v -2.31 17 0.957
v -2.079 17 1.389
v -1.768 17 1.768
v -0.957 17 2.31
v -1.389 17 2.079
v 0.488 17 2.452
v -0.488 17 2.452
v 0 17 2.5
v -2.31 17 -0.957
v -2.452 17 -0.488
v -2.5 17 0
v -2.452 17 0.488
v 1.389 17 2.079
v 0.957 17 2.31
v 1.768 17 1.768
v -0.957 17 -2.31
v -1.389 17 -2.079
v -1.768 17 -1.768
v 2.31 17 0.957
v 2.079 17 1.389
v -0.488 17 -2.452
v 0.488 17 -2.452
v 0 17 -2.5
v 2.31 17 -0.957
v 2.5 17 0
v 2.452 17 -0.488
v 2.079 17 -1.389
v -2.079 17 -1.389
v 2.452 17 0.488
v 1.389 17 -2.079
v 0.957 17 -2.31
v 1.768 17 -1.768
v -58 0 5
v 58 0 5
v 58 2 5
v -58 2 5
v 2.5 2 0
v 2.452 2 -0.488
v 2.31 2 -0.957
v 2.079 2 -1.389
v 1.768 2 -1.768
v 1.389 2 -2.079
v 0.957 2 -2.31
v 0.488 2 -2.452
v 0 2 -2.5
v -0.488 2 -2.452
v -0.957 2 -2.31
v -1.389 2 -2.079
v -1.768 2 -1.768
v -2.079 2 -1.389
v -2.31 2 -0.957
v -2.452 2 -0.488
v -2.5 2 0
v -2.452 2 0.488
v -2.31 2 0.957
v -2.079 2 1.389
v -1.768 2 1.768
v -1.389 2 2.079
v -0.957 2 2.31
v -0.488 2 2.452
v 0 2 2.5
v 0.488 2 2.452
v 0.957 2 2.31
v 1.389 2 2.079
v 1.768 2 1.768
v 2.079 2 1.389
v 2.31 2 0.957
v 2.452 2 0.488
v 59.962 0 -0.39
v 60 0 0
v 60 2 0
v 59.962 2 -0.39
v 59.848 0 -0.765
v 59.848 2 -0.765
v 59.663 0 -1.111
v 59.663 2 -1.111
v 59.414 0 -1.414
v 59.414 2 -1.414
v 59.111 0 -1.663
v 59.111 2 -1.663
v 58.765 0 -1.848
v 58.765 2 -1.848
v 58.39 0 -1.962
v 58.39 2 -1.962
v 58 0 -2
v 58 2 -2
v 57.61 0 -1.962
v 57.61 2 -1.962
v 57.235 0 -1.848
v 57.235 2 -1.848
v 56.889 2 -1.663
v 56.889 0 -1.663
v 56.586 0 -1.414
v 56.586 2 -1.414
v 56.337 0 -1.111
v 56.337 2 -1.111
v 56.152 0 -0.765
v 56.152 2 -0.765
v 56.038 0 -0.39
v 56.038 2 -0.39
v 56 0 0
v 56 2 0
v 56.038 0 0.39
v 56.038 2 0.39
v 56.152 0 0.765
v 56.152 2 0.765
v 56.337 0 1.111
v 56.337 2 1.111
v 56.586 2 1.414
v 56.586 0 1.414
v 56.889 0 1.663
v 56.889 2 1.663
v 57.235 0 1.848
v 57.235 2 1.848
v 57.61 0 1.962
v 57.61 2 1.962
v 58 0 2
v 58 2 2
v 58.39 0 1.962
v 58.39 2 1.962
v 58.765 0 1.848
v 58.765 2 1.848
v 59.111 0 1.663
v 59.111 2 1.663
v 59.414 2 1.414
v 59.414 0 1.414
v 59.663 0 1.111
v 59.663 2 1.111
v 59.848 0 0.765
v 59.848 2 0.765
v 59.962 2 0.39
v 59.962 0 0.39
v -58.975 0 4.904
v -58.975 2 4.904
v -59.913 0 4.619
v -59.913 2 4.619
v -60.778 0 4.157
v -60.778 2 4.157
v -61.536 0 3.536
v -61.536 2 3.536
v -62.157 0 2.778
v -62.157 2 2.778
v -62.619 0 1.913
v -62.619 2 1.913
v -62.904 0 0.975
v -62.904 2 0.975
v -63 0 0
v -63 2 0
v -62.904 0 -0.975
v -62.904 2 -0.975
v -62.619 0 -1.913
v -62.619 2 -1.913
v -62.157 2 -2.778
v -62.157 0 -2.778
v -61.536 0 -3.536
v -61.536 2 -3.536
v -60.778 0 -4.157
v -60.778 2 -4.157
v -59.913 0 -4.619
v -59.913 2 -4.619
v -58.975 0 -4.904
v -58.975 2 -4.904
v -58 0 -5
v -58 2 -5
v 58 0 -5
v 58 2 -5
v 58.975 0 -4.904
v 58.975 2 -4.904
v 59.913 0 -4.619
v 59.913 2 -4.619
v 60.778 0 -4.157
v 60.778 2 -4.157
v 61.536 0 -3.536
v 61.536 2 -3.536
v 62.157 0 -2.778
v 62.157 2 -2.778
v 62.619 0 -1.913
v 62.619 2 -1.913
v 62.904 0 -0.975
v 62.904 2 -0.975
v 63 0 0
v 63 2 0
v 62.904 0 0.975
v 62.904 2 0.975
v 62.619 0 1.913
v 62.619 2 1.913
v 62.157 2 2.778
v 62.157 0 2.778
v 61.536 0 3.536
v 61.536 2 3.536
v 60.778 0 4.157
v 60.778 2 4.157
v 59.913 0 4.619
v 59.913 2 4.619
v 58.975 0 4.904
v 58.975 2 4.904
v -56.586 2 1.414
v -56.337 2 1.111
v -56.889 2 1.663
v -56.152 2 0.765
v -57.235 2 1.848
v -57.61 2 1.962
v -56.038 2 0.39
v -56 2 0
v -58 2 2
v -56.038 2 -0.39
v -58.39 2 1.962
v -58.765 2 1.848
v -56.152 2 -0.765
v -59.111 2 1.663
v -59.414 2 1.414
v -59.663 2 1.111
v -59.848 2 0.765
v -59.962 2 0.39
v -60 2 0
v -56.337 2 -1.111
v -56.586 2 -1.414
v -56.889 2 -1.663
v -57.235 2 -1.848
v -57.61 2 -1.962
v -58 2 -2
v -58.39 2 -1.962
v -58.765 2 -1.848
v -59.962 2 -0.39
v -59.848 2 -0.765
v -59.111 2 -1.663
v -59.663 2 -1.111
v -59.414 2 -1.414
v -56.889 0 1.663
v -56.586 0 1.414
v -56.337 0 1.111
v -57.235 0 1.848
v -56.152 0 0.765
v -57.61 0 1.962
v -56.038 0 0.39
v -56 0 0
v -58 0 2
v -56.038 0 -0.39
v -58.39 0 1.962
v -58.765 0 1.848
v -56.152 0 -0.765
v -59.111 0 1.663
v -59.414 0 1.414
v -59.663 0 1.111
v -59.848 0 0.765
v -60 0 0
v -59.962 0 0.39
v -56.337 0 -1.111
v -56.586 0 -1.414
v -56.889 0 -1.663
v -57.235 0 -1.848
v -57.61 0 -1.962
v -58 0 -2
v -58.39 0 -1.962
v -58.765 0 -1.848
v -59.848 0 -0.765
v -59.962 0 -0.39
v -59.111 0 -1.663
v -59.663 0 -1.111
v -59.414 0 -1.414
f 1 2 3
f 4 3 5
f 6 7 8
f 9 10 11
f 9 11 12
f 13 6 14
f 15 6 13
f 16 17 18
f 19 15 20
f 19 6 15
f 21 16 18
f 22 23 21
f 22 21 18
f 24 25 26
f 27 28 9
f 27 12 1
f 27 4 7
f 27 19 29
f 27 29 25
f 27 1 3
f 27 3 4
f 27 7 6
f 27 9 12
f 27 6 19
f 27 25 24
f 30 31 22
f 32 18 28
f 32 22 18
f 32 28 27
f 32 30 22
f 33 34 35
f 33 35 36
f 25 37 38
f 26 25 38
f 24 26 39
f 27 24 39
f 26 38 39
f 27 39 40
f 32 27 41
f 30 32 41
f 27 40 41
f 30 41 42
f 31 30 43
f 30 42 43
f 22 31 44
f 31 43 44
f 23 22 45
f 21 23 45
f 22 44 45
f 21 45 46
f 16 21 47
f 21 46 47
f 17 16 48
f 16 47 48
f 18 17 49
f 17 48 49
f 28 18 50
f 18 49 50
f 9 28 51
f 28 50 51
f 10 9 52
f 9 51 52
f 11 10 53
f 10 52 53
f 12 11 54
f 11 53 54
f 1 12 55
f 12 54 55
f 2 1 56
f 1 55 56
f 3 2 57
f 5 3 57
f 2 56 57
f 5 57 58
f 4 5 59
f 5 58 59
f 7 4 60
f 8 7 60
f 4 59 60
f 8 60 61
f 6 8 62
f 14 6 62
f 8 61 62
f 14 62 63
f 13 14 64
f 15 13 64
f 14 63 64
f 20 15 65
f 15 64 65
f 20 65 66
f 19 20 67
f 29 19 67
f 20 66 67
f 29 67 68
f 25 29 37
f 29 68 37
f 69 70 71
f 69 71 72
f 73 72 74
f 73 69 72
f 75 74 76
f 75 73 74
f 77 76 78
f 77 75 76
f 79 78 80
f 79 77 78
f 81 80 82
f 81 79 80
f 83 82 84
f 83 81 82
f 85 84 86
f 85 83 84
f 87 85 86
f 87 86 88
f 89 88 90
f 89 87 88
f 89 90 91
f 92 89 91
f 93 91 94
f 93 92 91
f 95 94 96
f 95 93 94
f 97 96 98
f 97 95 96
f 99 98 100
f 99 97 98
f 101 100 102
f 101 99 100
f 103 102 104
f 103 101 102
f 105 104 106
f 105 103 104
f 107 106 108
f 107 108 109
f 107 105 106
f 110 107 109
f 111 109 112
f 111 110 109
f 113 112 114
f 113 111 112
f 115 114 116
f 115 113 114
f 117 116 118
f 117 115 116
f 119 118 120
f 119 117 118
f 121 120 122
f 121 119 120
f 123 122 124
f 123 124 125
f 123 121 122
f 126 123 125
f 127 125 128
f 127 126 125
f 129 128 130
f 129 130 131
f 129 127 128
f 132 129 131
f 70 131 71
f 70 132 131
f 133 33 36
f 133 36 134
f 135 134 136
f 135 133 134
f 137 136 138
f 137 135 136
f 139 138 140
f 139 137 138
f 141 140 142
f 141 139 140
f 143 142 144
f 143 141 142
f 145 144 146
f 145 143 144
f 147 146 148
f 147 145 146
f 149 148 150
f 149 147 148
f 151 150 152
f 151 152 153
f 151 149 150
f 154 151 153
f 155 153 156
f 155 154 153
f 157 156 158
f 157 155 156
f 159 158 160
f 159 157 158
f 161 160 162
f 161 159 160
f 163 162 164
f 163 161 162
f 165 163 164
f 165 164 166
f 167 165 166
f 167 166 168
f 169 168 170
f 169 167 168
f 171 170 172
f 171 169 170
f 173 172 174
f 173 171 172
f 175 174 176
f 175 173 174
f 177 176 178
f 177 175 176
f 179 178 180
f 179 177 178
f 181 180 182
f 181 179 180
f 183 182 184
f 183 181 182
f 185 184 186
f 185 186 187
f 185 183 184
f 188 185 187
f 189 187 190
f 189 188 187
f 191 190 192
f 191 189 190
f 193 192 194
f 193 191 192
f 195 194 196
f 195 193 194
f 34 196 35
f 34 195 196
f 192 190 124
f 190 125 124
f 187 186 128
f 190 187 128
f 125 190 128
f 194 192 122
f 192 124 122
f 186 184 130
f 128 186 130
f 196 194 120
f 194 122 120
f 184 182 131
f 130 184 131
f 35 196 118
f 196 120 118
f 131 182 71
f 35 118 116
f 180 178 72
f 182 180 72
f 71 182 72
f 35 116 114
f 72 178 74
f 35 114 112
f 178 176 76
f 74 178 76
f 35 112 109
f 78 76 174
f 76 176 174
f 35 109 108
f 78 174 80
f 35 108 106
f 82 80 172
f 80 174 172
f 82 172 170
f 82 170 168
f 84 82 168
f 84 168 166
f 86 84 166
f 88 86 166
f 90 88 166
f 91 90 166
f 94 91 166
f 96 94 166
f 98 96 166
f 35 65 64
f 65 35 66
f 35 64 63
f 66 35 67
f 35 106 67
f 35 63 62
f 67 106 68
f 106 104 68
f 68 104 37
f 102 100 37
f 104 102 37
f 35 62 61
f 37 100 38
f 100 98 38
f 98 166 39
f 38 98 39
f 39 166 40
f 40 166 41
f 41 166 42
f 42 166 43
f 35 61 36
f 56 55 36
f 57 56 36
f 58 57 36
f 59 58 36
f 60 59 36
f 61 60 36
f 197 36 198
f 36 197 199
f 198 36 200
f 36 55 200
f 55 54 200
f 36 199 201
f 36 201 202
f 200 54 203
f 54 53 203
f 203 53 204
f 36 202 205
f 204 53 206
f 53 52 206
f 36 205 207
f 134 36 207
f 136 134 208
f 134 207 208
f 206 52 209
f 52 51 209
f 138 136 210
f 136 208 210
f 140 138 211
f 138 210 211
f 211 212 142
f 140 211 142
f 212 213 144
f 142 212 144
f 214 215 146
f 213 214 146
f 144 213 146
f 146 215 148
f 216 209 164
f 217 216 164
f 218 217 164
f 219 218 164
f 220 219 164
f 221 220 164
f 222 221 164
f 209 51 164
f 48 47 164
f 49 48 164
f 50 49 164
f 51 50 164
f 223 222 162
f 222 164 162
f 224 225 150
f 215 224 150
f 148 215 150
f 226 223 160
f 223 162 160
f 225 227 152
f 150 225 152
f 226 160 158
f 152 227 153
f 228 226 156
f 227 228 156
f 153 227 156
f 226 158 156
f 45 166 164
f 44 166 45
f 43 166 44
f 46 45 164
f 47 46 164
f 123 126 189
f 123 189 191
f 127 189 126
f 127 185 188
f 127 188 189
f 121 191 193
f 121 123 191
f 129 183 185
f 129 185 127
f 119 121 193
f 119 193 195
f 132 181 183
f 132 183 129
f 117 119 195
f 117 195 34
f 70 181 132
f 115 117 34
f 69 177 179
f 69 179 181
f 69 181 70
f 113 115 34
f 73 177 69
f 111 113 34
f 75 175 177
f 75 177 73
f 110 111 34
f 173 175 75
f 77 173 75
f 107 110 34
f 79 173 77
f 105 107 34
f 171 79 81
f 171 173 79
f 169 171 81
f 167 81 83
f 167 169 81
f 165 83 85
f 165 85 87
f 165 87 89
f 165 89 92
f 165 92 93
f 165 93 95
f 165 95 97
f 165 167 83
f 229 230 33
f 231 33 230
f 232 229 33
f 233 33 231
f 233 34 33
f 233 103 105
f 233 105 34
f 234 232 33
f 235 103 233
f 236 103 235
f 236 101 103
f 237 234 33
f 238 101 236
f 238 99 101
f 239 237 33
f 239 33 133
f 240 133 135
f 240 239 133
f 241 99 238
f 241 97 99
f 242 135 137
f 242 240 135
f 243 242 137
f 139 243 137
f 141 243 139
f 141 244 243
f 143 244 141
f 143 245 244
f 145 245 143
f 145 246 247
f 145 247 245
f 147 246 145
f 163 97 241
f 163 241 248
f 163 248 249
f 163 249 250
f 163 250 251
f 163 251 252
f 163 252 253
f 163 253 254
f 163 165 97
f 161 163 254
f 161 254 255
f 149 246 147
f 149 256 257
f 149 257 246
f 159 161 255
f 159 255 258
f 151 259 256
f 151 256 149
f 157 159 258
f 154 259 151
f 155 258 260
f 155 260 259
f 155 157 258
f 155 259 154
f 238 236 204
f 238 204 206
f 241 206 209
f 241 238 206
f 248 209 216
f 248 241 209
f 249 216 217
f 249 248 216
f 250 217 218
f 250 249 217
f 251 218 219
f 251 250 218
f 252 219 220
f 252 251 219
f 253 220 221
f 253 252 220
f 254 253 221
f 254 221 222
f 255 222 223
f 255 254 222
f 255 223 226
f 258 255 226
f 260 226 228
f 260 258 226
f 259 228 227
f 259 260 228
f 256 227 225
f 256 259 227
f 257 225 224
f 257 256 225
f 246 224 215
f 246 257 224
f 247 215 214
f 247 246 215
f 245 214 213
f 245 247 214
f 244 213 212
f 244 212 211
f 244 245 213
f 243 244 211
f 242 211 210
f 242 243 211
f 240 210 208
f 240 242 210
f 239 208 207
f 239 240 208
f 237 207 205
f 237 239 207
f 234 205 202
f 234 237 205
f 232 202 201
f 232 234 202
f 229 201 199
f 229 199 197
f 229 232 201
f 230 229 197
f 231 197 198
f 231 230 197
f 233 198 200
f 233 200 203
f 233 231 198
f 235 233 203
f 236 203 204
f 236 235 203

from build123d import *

# Parameters (mm, degrees)
SKETCH1_R           = 2
BOSS_EXTRUDE1_DEPTH = 2
SKETCH2_R           = 2.5
BOSS_EXTRUDE2_DEPTH = 15


with BuildPart() as part:
    # Sketch1 → Boss-Extrude1 (new body)
    with BuildSketch(Plane(origin=(0, 0, 0), x_dir=(1, 0, 0), z_dir=(0, 1, 0))):
        with BuildLine():
            Line((-58, 5), (58, 5))
            ThreePointArc((58, 5), (63, 0), (58, -5))
            Line((58, -5), (-58, -5))
            ThreePointArc((-58, -5), (-63, 0), (-58, 5))
        make_face()
        with Locations((-58, 0)):
            Circle(SKETCH1_R, mode=Mode.SUBTRACT)
        with Locations((58, 0)):
            Circle(SKETCH1_R, mode=Mode.SUBTRACT)
    extrude(amount=BOSS_EXTRUDE1_DEPTH)

    # Sketch2 → Boss-Extrude2 (add)
    with BuildSketch(Plane(origin=(0, 2, 0), x_dir=(1, 0, 0), z_dir=(0, 1, 0))):
        Circle(SKETCH2_R)
    extrude(amount=BOSS_EXTRUDE2_DEPTH)


solid = part.part
